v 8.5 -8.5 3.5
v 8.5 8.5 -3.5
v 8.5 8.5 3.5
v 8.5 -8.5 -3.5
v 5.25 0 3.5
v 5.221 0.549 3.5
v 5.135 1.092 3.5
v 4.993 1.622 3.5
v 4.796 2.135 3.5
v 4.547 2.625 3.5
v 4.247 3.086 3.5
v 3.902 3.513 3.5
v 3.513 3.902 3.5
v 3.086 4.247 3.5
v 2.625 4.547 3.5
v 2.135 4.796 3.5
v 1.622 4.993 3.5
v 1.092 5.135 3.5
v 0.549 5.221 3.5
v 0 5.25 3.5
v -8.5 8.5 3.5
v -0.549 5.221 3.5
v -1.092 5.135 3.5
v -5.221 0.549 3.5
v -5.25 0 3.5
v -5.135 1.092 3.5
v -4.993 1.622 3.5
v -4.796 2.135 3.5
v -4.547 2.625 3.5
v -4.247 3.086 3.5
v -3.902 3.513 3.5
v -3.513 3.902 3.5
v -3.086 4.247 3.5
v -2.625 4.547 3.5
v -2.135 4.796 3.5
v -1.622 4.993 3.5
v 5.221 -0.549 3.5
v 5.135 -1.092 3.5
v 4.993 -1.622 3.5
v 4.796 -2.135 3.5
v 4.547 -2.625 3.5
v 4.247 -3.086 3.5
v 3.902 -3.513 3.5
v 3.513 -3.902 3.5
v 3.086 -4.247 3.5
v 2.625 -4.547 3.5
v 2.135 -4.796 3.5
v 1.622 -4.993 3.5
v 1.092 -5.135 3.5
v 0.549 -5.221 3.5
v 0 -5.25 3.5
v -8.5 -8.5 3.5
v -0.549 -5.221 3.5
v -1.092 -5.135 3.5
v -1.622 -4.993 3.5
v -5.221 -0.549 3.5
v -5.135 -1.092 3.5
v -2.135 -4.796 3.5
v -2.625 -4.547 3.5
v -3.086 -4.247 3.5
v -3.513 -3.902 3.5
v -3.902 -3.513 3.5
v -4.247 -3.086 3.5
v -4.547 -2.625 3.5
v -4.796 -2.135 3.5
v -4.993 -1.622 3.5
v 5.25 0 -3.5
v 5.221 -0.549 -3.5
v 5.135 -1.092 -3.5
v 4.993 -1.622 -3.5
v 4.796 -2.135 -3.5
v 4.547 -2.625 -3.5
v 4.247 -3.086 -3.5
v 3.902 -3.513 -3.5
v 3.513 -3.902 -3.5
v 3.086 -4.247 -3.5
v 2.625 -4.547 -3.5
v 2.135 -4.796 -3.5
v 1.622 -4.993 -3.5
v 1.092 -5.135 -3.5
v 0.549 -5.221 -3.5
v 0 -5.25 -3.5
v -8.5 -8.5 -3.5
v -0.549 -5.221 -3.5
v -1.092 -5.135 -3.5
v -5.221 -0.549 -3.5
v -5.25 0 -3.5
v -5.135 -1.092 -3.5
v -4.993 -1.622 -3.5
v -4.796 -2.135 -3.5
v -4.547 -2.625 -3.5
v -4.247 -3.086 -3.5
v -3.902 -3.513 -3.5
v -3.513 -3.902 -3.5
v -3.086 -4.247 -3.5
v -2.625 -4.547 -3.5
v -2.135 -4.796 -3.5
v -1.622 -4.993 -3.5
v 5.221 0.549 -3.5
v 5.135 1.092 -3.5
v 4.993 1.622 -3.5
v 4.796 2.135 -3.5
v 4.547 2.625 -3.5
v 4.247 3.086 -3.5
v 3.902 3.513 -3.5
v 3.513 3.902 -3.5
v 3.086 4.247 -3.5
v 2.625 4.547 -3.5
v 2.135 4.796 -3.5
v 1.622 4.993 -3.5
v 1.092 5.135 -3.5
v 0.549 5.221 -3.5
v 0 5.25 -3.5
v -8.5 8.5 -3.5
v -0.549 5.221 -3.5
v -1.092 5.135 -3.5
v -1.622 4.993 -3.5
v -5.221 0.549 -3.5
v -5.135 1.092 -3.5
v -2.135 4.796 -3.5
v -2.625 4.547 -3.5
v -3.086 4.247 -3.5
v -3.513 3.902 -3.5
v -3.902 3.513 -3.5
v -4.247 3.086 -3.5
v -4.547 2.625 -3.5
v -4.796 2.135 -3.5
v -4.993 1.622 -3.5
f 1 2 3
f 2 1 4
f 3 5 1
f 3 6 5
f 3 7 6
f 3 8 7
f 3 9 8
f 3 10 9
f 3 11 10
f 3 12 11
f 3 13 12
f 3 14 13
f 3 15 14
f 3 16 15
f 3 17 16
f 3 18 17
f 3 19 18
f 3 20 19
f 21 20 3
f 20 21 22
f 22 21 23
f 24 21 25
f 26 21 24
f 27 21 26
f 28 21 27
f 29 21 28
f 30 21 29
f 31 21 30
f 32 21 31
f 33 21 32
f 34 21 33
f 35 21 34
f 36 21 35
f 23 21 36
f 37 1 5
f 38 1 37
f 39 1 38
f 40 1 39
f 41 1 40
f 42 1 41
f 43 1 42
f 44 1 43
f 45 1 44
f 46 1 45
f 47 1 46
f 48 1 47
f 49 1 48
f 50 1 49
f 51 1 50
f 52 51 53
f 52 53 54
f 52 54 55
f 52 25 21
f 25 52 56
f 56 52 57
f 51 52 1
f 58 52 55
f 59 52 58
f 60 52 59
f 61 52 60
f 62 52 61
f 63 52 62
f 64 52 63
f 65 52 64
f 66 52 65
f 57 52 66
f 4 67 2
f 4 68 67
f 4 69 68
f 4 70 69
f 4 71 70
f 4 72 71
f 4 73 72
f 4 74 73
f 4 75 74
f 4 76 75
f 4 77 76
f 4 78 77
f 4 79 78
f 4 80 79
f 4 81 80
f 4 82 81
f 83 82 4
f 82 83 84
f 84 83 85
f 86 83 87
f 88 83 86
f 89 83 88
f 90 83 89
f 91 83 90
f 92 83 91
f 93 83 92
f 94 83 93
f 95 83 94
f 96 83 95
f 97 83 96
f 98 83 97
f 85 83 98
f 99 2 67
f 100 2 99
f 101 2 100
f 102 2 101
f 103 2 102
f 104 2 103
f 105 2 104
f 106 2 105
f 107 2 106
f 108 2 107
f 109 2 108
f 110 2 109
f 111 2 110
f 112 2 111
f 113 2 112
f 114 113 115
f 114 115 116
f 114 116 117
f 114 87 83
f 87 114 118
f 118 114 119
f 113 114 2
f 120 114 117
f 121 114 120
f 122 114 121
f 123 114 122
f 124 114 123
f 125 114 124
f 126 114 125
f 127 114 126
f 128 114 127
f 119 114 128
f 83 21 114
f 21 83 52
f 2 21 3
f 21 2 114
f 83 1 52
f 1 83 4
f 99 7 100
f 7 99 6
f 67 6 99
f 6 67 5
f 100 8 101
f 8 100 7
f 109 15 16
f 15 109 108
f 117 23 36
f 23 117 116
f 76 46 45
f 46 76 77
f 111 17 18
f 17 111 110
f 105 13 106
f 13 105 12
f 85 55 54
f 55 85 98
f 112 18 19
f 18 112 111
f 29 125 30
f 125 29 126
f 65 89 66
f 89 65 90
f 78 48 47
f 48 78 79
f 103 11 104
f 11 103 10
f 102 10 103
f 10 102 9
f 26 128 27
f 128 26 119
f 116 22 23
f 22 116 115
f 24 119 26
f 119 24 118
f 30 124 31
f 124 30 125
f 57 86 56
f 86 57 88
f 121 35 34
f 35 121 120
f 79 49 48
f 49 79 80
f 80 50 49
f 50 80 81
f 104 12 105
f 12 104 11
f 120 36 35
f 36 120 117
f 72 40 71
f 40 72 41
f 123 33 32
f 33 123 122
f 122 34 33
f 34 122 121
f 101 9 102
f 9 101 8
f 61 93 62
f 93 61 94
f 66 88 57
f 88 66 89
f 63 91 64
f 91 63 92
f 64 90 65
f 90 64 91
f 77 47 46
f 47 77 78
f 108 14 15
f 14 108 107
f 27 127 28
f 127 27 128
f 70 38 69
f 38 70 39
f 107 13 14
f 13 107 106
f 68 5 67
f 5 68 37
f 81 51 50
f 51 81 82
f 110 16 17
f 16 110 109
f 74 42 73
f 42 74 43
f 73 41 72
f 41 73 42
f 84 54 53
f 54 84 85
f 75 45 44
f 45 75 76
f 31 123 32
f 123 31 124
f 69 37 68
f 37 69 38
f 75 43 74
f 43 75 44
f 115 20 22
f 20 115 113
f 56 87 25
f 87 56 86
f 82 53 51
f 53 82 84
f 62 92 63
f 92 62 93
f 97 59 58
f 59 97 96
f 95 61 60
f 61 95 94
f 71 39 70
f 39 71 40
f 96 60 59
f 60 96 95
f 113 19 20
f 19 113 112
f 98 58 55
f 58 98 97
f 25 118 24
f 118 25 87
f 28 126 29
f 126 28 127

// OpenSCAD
// Square nut.
$fn = 60;
eps = 0.02;
thread_d = 10.5;
side = 17;
thickness = 7;
difference() {
    cube([side, side, thickness], center = true);
    translate([0, 0, -thickness / 2 - eps]) cylinder(d = thread_d, h = thickness + 2 * eps);
}
